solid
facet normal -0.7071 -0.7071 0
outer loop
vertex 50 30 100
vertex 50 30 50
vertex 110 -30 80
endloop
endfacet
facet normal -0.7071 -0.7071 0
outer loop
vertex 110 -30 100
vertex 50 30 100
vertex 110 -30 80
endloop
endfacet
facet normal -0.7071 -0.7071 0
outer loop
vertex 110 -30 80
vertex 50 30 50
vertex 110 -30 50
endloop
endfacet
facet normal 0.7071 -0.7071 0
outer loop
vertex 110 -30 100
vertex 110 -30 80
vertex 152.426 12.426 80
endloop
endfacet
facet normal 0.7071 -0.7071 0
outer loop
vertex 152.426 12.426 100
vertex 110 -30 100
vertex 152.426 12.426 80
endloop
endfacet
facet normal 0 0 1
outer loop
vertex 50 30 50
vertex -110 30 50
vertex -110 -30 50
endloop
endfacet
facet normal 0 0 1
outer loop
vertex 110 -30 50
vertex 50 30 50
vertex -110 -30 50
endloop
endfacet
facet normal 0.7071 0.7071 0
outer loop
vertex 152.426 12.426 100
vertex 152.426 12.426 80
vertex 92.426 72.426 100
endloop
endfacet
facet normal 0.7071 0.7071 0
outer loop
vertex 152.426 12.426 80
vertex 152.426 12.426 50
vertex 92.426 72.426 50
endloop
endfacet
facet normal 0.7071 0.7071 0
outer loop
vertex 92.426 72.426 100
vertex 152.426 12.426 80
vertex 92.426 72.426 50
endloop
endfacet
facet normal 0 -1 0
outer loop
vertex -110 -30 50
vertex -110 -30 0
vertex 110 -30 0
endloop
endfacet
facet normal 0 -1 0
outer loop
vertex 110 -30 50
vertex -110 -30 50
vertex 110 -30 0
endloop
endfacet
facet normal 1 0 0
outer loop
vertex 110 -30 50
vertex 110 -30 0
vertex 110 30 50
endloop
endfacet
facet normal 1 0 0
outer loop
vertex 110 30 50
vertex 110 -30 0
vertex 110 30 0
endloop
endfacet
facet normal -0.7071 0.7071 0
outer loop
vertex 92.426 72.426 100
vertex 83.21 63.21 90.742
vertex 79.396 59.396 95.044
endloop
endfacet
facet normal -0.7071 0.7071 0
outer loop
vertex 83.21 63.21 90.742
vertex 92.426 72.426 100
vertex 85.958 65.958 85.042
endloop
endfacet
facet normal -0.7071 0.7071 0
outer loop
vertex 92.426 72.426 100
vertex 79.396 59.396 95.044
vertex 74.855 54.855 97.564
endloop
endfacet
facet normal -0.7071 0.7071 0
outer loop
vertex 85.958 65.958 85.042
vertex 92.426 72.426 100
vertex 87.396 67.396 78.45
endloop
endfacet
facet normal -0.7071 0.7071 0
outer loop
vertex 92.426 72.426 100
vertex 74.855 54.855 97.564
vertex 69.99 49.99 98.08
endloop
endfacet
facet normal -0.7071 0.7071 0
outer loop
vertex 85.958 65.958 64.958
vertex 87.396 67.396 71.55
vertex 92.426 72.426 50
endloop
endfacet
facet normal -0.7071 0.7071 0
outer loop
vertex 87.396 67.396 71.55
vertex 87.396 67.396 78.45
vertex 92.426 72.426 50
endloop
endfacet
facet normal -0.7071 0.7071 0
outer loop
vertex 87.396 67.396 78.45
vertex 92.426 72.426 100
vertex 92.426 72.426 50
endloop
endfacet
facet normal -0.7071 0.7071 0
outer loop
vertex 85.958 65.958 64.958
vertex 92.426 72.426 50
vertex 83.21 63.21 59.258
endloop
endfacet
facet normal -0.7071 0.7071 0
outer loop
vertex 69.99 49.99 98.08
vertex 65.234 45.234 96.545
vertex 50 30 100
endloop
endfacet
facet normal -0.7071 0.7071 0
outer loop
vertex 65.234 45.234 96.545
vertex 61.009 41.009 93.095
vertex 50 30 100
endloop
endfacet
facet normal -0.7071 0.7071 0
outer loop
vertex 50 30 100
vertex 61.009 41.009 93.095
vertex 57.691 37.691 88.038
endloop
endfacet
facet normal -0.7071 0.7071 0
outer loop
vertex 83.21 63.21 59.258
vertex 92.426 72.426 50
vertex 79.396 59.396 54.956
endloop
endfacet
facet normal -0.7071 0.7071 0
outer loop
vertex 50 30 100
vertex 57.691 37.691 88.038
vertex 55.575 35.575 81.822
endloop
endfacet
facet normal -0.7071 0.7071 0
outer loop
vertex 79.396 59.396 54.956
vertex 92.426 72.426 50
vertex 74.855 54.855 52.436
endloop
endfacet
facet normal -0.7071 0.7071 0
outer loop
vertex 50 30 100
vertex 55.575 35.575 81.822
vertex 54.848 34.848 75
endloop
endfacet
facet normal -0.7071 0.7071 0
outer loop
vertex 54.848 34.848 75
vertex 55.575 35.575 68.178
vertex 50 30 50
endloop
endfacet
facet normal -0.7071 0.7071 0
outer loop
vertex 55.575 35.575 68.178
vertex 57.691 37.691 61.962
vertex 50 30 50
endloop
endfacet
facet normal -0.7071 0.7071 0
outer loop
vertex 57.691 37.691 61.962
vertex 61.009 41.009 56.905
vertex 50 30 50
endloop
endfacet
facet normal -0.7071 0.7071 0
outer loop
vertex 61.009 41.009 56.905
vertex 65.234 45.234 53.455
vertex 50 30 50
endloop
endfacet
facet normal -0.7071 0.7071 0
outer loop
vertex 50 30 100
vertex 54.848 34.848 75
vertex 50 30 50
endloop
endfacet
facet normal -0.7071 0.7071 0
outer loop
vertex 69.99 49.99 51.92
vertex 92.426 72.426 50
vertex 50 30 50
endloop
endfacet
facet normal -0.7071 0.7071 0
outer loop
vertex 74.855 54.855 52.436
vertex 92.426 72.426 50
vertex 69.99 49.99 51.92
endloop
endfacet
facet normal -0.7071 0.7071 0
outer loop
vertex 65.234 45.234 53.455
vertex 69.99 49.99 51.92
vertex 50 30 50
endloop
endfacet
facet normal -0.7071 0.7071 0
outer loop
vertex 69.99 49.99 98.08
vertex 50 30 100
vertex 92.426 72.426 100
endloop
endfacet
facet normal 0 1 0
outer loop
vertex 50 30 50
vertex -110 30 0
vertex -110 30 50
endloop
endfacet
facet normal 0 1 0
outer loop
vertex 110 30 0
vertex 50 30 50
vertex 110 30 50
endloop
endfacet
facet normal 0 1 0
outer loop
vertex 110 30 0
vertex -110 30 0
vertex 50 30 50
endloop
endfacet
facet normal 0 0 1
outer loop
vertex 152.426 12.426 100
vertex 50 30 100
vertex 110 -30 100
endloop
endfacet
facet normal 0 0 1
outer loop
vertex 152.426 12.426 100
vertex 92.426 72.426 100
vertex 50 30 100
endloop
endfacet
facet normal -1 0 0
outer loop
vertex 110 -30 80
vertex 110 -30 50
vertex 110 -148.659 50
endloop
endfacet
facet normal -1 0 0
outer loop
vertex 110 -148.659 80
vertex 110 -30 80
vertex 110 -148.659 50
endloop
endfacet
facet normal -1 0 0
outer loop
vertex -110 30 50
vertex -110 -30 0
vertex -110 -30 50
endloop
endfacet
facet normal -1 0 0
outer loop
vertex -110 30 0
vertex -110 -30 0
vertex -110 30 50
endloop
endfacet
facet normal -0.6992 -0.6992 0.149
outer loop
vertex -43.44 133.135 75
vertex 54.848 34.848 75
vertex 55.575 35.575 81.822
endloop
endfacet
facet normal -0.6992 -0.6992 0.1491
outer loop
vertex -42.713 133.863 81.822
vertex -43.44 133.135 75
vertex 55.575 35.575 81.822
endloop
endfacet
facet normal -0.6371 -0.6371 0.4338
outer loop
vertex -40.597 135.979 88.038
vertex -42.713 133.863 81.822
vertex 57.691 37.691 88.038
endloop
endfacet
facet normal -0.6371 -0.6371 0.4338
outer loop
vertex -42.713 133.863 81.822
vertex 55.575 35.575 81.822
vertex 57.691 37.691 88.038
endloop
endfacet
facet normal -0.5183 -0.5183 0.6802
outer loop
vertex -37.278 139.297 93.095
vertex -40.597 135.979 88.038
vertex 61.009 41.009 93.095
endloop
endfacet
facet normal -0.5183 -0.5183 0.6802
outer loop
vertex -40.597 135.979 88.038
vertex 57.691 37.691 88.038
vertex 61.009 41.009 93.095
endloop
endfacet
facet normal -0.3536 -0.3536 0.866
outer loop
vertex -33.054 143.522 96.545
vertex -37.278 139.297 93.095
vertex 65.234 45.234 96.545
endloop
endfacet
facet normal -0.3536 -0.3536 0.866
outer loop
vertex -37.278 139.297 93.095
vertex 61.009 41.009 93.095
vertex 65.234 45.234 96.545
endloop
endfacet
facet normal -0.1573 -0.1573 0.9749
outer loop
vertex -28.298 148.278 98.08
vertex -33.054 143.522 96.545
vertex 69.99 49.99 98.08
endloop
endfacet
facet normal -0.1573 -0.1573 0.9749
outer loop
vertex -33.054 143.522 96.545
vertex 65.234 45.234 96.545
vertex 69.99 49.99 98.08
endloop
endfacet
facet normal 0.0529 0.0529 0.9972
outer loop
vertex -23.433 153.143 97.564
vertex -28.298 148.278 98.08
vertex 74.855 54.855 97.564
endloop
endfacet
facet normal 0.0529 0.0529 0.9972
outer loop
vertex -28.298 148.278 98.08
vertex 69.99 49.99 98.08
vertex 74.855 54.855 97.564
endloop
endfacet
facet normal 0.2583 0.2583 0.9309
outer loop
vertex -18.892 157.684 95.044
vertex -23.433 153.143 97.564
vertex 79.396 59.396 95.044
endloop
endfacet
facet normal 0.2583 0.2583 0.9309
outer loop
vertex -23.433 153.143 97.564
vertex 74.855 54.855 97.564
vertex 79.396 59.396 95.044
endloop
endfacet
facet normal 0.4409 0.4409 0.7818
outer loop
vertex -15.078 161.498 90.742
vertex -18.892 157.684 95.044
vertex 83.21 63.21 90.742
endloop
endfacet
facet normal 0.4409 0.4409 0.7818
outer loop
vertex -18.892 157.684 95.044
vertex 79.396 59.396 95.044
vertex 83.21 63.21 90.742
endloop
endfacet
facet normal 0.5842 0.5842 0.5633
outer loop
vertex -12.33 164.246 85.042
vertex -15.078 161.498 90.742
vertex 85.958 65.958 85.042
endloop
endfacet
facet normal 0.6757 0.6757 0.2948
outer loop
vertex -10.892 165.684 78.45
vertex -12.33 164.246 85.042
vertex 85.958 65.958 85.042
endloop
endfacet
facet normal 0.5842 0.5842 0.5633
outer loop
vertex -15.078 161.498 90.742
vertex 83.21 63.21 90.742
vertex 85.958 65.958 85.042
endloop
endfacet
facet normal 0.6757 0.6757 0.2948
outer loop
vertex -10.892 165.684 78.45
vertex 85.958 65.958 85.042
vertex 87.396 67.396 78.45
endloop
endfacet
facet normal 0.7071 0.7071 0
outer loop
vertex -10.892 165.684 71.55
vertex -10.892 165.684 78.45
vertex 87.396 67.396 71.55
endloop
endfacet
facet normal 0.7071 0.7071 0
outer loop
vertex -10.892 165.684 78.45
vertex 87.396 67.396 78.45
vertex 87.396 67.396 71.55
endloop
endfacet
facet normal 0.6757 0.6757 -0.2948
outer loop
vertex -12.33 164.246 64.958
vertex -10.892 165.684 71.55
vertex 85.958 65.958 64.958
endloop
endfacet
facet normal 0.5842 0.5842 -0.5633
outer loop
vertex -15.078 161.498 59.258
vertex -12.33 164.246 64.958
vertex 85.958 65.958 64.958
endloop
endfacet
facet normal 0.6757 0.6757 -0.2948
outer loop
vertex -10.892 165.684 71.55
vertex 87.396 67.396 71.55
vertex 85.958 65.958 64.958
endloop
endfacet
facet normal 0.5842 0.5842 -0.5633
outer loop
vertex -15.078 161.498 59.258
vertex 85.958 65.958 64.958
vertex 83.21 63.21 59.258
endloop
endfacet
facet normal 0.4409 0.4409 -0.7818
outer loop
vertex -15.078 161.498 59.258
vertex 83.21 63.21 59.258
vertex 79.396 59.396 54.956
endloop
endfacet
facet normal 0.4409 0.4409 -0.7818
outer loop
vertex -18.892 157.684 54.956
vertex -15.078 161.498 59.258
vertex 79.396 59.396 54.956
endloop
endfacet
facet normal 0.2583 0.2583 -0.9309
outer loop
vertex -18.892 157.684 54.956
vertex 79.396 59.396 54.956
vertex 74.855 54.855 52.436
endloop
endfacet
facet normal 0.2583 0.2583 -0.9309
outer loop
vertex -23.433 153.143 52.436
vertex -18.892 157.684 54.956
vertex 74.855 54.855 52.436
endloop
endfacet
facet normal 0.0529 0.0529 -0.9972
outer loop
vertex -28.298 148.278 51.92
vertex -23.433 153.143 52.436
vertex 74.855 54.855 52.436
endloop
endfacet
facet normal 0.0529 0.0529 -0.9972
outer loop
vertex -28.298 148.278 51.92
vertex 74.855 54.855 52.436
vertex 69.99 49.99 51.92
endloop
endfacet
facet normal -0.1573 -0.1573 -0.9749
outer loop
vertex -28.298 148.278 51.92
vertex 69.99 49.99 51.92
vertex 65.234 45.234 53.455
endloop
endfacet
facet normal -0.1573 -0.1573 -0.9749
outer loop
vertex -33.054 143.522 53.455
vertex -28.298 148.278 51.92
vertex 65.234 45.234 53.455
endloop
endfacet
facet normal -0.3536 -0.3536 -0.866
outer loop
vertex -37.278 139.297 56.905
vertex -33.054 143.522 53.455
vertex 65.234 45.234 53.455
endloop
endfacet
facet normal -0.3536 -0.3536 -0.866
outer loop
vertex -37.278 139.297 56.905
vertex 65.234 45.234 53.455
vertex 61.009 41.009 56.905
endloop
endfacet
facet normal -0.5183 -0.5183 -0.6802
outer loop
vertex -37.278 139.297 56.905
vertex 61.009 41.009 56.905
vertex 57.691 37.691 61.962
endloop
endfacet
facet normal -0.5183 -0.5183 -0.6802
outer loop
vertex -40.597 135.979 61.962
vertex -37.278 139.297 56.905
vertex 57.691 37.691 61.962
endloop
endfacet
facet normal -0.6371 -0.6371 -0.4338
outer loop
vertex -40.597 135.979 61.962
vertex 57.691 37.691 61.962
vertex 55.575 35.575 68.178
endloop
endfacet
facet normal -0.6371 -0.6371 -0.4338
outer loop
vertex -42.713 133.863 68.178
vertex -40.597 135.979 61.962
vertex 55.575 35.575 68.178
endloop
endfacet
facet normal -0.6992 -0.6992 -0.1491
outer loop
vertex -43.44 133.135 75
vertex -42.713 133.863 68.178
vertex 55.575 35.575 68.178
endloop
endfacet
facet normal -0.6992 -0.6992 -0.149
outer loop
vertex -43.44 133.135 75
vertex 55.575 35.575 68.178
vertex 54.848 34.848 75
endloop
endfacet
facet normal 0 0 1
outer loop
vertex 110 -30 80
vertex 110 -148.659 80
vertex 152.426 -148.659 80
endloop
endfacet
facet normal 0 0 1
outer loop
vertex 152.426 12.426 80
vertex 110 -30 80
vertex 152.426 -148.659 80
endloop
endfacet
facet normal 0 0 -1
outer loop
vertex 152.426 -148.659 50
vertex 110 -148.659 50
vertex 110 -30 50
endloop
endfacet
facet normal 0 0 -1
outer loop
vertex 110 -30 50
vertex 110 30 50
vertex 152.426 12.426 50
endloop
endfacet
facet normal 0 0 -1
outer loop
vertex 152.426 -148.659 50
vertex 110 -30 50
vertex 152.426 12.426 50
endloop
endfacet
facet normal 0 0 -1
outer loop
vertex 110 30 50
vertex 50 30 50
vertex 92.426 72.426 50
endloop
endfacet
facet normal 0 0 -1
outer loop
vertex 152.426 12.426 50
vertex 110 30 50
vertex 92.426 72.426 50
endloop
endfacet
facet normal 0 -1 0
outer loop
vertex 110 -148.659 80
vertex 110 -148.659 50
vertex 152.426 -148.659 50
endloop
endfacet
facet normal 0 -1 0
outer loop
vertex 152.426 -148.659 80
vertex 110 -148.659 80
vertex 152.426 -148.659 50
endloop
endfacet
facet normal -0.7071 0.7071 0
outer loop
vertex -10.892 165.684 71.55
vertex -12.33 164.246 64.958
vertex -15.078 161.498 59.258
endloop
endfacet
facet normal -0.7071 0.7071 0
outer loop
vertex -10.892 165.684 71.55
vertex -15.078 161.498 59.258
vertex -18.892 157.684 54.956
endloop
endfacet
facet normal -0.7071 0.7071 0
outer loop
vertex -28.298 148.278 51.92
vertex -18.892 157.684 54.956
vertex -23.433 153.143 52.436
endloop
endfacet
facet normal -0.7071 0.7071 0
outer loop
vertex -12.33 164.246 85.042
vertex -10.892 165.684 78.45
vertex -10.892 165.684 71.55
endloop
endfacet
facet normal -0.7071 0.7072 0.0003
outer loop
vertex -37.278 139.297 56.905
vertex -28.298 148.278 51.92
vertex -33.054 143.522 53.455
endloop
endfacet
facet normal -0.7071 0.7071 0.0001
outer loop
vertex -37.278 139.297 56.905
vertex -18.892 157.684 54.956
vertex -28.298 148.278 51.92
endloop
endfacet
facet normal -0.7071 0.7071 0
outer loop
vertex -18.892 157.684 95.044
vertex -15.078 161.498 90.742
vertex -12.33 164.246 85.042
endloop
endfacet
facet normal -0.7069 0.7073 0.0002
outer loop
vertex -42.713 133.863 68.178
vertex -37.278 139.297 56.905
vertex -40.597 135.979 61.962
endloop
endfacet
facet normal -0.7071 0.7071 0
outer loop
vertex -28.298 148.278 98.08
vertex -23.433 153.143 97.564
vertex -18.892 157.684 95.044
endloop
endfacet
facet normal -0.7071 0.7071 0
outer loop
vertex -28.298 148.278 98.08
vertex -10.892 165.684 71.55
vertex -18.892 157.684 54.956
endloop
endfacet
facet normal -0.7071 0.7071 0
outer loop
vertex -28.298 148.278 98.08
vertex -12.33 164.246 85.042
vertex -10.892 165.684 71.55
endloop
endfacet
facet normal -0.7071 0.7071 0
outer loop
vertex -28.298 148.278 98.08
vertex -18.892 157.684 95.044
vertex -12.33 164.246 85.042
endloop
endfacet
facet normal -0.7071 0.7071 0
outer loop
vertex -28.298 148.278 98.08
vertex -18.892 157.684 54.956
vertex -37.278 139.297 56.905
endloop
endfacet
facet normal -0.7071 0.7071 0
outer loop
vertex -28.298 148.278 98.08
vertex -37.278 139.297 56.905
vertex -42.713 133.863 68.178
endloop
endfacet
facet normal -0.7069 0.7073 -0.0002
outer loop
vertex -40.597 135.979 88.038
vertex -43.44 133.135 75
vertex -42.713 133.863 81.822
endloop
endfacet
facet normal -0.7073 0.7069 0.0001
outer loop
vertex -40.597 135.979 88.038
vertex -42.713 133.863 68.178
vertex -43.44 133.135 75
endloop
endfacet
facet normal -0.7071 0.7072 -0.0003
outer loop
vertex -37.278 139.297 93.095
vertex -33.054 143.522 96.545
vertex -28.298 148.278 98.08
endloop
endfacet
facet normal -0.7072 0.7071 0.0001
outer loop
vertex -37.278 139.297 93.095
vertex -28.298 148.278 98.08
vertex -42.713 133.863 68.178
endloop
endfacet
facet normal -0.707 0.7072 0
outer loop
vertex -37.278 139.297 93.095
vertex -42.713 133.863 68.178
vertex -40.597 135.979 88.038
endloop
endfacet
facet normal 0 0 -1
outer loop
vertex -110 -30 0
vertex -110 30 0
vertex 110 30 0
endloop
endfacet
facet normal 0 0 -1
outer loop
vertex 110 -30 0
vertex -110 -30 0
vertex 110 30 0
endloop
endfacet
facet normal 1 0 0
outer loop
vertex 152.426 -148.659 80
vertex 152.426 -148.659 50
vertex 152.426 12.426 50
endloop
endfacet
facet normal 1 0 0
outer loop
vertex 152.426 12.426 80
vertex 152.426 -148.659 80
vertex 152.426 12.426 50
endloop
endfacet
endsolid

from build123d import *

# Parameters (mm, degrees)
F0_W     = 220
F0_H     = 60
F1_DEPTH = 50
F3_DEPTH = 50
F4_DEPTH = 25
F5_R     = 20
F6_DEPTH = 60
F6_TAPER = -3
F7_DEPTH = 199
F9_DEPTH = 30


with BuildPart() as f1:
    # F0 (on Top) → F1 (new body)
    with BuildSketch(Plane.XY):
        Rectangle(F0_W, F0_H)
    extrude(amount=F1_DEPTH)

    # F2 (on face) → F3 (join)
    with BuildSketch(Plane.XY.offset(50)):
        Polygon((50, 30), (110, -30), (152.4264068712, 12.4264068712), (92.4264068712, 72.4264068712), align=None)
    extrude(amount=F3_DEPTH)

    # F2 (on face) → F4 (join)
    with BuildSketch(Plane.XY.offset(50)):
        Polygon((50, 30), (110, -30), (152.4264068712, 12.4264068712), (92.4264068712, 72.4264068712), align=None)
    extrude(amount=F4_DEPTH)

    # F5 (on face) → F6 (cut)
    with BuildSketch(Plane(origin=(10, -10, 0), x_dir=(-0.7071067812, -0.7071067812, 0), z_dir=(-0.7071067812, 0.7071067812, 0))):
        with Locations((-86.5685424949, 75)):
            Circle(F5_R)
    extrude(amount=-F6_DEPTH, taper=F6_TAPER, mode=Mode.SUBTRACT)

    # F7 (add): a face of the model
    f7_faces = [f1.faces().sort_by_distance(p)[0] for p in [
        (113.6396103068, 8.7867965644, 75),
    ]]
    extrude(f7_faces, amount=F7_DEPTH)

    # F8 (on face) → F9 (join)
    with BuildSketch(Plane.XY.offset(50)):
        Polygon((152.4264068712, 12.4264068712), (110, -30), (110, -148.6592590809), (152.4264068712, -148.6592590809), align=None)
    extrude(amount=F9_DEPTH)


solid = f1.part
